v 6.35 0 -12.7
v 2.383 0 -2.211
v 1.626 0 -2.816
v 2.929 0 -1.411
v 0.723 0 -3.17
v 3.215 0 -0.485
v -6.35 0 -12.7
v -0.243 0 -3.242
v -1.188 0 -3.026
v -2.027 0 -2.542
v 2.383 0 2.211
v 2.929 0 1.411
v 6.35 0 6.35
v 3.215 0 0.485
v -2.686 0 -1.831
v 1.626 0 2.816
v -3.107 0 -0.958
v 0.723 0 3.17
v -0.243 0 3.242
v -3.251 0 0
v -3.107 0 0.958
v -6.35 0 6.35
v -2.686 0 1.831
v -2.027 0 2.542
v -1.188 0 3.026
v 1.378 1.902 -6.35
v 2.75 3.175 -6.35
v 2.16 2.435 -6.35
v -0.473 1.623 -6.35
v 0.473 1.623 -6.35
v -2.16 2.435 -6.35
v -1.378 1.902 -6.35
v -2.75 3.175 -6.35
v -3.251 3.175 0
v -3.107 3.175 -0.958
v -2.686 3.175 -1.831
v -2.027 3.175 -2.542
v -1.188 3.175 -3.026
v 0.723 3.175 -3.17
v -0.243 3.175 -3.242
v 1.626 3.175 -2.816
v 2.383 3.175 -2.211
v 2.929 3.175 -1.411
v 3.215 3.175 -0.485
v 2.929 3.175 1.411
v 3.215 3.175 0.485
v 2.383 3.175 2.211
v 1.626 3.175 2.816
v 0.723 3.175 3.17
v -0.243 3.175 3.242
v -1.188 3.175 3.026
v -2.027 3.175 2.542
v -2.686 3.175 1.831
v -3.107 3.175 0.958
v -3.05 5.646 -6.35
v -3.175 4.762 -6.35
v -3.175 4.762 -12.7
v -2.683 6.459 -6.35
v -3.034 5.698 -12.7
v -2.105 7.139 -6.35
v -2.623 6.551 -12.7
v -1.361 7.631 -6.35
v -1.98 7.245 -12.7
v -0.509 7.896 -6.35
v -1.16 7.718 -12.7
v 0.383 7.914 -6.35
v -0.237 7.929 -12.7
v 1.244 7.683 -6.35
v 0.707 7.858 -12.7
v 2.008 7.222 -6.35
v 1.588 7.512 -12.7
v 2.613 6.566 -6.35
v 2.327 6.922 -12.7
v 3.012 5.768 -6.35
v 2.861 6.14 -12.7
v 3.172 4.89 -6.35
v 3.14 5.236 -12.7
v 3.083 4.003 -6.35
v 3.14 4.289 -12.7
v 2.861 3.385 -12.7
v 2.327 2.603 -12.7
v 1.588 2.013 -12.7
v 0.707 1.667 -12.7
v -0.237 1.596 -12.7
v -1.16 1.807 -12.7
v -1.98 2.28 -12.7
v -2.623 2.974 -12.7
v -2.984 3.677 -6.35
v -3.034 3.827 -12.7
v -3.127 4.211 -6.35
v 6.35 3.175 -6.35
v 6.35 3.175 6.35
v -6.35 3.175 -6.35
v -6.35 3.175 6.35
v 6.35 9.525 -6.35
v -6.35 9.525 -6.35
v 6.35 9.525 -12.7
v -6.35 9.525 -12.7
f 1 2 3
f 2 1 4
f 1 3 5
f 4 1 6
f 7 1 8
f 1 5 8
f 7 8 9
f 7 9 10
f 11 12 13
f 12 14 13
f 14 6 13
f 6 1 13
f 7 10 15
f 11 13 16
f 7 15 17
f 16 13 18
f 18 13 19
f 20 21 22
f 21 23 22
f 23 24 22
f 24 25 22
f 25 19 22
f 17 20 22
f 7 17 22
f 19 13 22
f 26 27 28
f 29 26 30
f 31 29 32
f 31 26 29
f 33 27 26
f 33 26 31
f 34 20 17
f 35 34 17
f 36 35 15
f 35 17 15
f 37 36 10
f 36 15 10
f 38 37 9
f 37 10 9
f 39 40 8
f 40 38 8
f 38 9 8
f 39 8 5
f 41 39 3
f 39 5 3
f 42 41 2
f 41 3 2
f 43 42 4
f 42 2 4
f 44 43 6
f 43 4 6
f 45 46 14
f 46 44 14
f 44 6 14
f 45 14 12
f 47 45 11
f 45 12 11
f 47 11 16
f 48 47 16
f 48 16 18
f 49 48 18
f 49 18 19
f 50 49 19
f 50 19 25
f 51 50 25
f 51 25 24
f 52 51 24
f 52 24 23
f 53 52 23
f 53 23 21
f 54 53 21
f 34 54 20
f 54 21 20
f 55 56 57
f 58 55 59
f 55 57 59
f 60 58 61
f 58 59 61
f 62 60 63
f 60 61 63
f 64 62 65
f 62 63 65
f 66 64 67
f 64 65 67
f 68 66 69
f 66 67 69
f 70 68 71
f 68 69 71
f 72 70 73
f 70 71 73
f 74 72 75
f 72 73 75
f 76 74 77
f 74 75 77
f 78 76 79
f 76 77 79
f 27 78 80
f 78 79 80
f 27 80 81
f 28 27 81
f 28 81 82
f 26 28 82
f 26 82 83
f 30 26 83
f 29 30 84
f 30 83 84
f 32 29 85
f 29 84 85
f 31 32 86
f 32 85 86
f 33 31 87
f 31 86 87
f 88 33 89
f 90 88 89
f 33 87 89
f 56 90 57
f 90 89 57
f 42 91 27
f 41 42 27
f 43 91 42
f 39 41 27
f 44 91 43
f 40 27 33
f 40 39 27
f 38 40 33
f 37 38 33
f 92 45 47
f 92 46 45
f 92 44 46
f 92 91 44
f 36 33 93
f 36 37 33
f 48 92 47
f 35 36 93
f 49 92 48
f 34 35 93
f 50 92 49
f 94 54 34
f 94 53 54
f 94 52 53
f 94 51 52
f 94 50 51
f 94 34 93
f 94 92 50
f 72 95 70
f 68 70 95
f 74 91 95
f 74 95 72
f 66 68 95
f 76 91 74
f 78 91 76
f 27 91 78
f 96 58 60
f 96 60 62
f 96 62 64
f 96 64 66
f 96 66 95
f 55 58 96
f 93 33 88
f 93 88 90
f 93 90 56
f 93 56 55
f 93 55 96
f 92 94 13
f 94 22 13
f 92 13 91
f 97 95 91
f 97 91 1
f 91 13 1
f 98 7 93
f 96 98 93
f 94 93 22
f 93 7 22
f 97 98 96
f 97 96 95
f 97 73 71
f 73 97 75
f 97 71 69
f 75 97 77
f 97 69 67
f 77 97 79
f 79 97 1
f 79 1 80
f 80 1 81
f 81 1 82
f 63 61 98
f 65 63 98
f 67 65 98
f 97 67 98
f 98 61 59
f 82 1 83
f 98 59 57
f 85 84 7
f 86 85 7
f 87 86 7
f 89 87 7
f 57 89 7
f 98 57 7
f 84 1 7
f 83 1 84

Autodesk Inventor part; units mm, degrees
ref_plane "YZ Plane" through (0, 0, 0) normal (1, 0, 0) x (0, 1, 0)
ref_plane "XZ Plane" through (0, 0, 0) normal (0, 1, 0) x (-1, 0, 0)
ref_plane "XY Plane" through (0, 0, 0) normal (0, 0, 1) x (1, 0, 0)
sketch "Sketch1" plane through (0, 0, 0) normal (0, 1, 0) x (-1, 0, 0)
  circle A0 centre (0, 0) radius 3.2512
  line L0 (6.35, 6.35) -> (-6.35, 6.35)
  line L1 (-6.35, 6.35) -> (-6.35, -12.7)
  line L2 (-6.35, -12.7) -> (6.35, -12.7)
  line L3 (6.35, -12.7) -> (6.35, 6.35)
  point P0 (0, 6.35)
  dimension "d0" = 6.5024
  dimension "d1" = 12.7
  dimension "d2" = 19.05
  dimension "d3" = 6.35
extrude "Extrusion1" add sketch "Sketch1" along normal blind 3.175
sketch "Sketch2" plane through (0, 3.175, 0) normal (0, 1, 0) x (1, 0, 0)
  line L0 (6.35, 12.7) -> (-6.35, 12.7) projected
  line L1 (6.35, -6.35) -> (6.35, 12.7) projected
  line L2 (-6.35, 12.7) -> (6.35, 12.7)
  line L3 (6.35, 12.7) -> (6.35, 6.35)
  line L4 (6.35, 6.35) -> (-6.35, 6.35)
  line L5 (-6.35, 6.35) -> (-6.35, 12.7)
  point P0 (0, 0)
  dimension "d6" = 6.35
extrude "Extrusion2" add sketch "Sketch2" along normal blind 6.35
sketch "Sketch3" plane through (6.35, 0, -12.7) normal (0, 0, -1) x (-1, 0, 0)
  circle A0 centre (6.35, 4.7625) radius 3.175
  line L0 (12.7, 0) -> (12.7, 9.525) projected
  line L1 (0, 9.525) -> (12.7, 9.525) projected
  point P0 (6.35, 0)
  point P1 (12.7, 4.7625)
  point P2 (6.35, 9.525)
  dimension "d9" = 6.35
extrude "Extrusion3" cut sketch "Sketch3" against normal up to surface (6.35 mm away)
properties part number "OUTK_022_BadPivot" material "Aluminum 6061"
